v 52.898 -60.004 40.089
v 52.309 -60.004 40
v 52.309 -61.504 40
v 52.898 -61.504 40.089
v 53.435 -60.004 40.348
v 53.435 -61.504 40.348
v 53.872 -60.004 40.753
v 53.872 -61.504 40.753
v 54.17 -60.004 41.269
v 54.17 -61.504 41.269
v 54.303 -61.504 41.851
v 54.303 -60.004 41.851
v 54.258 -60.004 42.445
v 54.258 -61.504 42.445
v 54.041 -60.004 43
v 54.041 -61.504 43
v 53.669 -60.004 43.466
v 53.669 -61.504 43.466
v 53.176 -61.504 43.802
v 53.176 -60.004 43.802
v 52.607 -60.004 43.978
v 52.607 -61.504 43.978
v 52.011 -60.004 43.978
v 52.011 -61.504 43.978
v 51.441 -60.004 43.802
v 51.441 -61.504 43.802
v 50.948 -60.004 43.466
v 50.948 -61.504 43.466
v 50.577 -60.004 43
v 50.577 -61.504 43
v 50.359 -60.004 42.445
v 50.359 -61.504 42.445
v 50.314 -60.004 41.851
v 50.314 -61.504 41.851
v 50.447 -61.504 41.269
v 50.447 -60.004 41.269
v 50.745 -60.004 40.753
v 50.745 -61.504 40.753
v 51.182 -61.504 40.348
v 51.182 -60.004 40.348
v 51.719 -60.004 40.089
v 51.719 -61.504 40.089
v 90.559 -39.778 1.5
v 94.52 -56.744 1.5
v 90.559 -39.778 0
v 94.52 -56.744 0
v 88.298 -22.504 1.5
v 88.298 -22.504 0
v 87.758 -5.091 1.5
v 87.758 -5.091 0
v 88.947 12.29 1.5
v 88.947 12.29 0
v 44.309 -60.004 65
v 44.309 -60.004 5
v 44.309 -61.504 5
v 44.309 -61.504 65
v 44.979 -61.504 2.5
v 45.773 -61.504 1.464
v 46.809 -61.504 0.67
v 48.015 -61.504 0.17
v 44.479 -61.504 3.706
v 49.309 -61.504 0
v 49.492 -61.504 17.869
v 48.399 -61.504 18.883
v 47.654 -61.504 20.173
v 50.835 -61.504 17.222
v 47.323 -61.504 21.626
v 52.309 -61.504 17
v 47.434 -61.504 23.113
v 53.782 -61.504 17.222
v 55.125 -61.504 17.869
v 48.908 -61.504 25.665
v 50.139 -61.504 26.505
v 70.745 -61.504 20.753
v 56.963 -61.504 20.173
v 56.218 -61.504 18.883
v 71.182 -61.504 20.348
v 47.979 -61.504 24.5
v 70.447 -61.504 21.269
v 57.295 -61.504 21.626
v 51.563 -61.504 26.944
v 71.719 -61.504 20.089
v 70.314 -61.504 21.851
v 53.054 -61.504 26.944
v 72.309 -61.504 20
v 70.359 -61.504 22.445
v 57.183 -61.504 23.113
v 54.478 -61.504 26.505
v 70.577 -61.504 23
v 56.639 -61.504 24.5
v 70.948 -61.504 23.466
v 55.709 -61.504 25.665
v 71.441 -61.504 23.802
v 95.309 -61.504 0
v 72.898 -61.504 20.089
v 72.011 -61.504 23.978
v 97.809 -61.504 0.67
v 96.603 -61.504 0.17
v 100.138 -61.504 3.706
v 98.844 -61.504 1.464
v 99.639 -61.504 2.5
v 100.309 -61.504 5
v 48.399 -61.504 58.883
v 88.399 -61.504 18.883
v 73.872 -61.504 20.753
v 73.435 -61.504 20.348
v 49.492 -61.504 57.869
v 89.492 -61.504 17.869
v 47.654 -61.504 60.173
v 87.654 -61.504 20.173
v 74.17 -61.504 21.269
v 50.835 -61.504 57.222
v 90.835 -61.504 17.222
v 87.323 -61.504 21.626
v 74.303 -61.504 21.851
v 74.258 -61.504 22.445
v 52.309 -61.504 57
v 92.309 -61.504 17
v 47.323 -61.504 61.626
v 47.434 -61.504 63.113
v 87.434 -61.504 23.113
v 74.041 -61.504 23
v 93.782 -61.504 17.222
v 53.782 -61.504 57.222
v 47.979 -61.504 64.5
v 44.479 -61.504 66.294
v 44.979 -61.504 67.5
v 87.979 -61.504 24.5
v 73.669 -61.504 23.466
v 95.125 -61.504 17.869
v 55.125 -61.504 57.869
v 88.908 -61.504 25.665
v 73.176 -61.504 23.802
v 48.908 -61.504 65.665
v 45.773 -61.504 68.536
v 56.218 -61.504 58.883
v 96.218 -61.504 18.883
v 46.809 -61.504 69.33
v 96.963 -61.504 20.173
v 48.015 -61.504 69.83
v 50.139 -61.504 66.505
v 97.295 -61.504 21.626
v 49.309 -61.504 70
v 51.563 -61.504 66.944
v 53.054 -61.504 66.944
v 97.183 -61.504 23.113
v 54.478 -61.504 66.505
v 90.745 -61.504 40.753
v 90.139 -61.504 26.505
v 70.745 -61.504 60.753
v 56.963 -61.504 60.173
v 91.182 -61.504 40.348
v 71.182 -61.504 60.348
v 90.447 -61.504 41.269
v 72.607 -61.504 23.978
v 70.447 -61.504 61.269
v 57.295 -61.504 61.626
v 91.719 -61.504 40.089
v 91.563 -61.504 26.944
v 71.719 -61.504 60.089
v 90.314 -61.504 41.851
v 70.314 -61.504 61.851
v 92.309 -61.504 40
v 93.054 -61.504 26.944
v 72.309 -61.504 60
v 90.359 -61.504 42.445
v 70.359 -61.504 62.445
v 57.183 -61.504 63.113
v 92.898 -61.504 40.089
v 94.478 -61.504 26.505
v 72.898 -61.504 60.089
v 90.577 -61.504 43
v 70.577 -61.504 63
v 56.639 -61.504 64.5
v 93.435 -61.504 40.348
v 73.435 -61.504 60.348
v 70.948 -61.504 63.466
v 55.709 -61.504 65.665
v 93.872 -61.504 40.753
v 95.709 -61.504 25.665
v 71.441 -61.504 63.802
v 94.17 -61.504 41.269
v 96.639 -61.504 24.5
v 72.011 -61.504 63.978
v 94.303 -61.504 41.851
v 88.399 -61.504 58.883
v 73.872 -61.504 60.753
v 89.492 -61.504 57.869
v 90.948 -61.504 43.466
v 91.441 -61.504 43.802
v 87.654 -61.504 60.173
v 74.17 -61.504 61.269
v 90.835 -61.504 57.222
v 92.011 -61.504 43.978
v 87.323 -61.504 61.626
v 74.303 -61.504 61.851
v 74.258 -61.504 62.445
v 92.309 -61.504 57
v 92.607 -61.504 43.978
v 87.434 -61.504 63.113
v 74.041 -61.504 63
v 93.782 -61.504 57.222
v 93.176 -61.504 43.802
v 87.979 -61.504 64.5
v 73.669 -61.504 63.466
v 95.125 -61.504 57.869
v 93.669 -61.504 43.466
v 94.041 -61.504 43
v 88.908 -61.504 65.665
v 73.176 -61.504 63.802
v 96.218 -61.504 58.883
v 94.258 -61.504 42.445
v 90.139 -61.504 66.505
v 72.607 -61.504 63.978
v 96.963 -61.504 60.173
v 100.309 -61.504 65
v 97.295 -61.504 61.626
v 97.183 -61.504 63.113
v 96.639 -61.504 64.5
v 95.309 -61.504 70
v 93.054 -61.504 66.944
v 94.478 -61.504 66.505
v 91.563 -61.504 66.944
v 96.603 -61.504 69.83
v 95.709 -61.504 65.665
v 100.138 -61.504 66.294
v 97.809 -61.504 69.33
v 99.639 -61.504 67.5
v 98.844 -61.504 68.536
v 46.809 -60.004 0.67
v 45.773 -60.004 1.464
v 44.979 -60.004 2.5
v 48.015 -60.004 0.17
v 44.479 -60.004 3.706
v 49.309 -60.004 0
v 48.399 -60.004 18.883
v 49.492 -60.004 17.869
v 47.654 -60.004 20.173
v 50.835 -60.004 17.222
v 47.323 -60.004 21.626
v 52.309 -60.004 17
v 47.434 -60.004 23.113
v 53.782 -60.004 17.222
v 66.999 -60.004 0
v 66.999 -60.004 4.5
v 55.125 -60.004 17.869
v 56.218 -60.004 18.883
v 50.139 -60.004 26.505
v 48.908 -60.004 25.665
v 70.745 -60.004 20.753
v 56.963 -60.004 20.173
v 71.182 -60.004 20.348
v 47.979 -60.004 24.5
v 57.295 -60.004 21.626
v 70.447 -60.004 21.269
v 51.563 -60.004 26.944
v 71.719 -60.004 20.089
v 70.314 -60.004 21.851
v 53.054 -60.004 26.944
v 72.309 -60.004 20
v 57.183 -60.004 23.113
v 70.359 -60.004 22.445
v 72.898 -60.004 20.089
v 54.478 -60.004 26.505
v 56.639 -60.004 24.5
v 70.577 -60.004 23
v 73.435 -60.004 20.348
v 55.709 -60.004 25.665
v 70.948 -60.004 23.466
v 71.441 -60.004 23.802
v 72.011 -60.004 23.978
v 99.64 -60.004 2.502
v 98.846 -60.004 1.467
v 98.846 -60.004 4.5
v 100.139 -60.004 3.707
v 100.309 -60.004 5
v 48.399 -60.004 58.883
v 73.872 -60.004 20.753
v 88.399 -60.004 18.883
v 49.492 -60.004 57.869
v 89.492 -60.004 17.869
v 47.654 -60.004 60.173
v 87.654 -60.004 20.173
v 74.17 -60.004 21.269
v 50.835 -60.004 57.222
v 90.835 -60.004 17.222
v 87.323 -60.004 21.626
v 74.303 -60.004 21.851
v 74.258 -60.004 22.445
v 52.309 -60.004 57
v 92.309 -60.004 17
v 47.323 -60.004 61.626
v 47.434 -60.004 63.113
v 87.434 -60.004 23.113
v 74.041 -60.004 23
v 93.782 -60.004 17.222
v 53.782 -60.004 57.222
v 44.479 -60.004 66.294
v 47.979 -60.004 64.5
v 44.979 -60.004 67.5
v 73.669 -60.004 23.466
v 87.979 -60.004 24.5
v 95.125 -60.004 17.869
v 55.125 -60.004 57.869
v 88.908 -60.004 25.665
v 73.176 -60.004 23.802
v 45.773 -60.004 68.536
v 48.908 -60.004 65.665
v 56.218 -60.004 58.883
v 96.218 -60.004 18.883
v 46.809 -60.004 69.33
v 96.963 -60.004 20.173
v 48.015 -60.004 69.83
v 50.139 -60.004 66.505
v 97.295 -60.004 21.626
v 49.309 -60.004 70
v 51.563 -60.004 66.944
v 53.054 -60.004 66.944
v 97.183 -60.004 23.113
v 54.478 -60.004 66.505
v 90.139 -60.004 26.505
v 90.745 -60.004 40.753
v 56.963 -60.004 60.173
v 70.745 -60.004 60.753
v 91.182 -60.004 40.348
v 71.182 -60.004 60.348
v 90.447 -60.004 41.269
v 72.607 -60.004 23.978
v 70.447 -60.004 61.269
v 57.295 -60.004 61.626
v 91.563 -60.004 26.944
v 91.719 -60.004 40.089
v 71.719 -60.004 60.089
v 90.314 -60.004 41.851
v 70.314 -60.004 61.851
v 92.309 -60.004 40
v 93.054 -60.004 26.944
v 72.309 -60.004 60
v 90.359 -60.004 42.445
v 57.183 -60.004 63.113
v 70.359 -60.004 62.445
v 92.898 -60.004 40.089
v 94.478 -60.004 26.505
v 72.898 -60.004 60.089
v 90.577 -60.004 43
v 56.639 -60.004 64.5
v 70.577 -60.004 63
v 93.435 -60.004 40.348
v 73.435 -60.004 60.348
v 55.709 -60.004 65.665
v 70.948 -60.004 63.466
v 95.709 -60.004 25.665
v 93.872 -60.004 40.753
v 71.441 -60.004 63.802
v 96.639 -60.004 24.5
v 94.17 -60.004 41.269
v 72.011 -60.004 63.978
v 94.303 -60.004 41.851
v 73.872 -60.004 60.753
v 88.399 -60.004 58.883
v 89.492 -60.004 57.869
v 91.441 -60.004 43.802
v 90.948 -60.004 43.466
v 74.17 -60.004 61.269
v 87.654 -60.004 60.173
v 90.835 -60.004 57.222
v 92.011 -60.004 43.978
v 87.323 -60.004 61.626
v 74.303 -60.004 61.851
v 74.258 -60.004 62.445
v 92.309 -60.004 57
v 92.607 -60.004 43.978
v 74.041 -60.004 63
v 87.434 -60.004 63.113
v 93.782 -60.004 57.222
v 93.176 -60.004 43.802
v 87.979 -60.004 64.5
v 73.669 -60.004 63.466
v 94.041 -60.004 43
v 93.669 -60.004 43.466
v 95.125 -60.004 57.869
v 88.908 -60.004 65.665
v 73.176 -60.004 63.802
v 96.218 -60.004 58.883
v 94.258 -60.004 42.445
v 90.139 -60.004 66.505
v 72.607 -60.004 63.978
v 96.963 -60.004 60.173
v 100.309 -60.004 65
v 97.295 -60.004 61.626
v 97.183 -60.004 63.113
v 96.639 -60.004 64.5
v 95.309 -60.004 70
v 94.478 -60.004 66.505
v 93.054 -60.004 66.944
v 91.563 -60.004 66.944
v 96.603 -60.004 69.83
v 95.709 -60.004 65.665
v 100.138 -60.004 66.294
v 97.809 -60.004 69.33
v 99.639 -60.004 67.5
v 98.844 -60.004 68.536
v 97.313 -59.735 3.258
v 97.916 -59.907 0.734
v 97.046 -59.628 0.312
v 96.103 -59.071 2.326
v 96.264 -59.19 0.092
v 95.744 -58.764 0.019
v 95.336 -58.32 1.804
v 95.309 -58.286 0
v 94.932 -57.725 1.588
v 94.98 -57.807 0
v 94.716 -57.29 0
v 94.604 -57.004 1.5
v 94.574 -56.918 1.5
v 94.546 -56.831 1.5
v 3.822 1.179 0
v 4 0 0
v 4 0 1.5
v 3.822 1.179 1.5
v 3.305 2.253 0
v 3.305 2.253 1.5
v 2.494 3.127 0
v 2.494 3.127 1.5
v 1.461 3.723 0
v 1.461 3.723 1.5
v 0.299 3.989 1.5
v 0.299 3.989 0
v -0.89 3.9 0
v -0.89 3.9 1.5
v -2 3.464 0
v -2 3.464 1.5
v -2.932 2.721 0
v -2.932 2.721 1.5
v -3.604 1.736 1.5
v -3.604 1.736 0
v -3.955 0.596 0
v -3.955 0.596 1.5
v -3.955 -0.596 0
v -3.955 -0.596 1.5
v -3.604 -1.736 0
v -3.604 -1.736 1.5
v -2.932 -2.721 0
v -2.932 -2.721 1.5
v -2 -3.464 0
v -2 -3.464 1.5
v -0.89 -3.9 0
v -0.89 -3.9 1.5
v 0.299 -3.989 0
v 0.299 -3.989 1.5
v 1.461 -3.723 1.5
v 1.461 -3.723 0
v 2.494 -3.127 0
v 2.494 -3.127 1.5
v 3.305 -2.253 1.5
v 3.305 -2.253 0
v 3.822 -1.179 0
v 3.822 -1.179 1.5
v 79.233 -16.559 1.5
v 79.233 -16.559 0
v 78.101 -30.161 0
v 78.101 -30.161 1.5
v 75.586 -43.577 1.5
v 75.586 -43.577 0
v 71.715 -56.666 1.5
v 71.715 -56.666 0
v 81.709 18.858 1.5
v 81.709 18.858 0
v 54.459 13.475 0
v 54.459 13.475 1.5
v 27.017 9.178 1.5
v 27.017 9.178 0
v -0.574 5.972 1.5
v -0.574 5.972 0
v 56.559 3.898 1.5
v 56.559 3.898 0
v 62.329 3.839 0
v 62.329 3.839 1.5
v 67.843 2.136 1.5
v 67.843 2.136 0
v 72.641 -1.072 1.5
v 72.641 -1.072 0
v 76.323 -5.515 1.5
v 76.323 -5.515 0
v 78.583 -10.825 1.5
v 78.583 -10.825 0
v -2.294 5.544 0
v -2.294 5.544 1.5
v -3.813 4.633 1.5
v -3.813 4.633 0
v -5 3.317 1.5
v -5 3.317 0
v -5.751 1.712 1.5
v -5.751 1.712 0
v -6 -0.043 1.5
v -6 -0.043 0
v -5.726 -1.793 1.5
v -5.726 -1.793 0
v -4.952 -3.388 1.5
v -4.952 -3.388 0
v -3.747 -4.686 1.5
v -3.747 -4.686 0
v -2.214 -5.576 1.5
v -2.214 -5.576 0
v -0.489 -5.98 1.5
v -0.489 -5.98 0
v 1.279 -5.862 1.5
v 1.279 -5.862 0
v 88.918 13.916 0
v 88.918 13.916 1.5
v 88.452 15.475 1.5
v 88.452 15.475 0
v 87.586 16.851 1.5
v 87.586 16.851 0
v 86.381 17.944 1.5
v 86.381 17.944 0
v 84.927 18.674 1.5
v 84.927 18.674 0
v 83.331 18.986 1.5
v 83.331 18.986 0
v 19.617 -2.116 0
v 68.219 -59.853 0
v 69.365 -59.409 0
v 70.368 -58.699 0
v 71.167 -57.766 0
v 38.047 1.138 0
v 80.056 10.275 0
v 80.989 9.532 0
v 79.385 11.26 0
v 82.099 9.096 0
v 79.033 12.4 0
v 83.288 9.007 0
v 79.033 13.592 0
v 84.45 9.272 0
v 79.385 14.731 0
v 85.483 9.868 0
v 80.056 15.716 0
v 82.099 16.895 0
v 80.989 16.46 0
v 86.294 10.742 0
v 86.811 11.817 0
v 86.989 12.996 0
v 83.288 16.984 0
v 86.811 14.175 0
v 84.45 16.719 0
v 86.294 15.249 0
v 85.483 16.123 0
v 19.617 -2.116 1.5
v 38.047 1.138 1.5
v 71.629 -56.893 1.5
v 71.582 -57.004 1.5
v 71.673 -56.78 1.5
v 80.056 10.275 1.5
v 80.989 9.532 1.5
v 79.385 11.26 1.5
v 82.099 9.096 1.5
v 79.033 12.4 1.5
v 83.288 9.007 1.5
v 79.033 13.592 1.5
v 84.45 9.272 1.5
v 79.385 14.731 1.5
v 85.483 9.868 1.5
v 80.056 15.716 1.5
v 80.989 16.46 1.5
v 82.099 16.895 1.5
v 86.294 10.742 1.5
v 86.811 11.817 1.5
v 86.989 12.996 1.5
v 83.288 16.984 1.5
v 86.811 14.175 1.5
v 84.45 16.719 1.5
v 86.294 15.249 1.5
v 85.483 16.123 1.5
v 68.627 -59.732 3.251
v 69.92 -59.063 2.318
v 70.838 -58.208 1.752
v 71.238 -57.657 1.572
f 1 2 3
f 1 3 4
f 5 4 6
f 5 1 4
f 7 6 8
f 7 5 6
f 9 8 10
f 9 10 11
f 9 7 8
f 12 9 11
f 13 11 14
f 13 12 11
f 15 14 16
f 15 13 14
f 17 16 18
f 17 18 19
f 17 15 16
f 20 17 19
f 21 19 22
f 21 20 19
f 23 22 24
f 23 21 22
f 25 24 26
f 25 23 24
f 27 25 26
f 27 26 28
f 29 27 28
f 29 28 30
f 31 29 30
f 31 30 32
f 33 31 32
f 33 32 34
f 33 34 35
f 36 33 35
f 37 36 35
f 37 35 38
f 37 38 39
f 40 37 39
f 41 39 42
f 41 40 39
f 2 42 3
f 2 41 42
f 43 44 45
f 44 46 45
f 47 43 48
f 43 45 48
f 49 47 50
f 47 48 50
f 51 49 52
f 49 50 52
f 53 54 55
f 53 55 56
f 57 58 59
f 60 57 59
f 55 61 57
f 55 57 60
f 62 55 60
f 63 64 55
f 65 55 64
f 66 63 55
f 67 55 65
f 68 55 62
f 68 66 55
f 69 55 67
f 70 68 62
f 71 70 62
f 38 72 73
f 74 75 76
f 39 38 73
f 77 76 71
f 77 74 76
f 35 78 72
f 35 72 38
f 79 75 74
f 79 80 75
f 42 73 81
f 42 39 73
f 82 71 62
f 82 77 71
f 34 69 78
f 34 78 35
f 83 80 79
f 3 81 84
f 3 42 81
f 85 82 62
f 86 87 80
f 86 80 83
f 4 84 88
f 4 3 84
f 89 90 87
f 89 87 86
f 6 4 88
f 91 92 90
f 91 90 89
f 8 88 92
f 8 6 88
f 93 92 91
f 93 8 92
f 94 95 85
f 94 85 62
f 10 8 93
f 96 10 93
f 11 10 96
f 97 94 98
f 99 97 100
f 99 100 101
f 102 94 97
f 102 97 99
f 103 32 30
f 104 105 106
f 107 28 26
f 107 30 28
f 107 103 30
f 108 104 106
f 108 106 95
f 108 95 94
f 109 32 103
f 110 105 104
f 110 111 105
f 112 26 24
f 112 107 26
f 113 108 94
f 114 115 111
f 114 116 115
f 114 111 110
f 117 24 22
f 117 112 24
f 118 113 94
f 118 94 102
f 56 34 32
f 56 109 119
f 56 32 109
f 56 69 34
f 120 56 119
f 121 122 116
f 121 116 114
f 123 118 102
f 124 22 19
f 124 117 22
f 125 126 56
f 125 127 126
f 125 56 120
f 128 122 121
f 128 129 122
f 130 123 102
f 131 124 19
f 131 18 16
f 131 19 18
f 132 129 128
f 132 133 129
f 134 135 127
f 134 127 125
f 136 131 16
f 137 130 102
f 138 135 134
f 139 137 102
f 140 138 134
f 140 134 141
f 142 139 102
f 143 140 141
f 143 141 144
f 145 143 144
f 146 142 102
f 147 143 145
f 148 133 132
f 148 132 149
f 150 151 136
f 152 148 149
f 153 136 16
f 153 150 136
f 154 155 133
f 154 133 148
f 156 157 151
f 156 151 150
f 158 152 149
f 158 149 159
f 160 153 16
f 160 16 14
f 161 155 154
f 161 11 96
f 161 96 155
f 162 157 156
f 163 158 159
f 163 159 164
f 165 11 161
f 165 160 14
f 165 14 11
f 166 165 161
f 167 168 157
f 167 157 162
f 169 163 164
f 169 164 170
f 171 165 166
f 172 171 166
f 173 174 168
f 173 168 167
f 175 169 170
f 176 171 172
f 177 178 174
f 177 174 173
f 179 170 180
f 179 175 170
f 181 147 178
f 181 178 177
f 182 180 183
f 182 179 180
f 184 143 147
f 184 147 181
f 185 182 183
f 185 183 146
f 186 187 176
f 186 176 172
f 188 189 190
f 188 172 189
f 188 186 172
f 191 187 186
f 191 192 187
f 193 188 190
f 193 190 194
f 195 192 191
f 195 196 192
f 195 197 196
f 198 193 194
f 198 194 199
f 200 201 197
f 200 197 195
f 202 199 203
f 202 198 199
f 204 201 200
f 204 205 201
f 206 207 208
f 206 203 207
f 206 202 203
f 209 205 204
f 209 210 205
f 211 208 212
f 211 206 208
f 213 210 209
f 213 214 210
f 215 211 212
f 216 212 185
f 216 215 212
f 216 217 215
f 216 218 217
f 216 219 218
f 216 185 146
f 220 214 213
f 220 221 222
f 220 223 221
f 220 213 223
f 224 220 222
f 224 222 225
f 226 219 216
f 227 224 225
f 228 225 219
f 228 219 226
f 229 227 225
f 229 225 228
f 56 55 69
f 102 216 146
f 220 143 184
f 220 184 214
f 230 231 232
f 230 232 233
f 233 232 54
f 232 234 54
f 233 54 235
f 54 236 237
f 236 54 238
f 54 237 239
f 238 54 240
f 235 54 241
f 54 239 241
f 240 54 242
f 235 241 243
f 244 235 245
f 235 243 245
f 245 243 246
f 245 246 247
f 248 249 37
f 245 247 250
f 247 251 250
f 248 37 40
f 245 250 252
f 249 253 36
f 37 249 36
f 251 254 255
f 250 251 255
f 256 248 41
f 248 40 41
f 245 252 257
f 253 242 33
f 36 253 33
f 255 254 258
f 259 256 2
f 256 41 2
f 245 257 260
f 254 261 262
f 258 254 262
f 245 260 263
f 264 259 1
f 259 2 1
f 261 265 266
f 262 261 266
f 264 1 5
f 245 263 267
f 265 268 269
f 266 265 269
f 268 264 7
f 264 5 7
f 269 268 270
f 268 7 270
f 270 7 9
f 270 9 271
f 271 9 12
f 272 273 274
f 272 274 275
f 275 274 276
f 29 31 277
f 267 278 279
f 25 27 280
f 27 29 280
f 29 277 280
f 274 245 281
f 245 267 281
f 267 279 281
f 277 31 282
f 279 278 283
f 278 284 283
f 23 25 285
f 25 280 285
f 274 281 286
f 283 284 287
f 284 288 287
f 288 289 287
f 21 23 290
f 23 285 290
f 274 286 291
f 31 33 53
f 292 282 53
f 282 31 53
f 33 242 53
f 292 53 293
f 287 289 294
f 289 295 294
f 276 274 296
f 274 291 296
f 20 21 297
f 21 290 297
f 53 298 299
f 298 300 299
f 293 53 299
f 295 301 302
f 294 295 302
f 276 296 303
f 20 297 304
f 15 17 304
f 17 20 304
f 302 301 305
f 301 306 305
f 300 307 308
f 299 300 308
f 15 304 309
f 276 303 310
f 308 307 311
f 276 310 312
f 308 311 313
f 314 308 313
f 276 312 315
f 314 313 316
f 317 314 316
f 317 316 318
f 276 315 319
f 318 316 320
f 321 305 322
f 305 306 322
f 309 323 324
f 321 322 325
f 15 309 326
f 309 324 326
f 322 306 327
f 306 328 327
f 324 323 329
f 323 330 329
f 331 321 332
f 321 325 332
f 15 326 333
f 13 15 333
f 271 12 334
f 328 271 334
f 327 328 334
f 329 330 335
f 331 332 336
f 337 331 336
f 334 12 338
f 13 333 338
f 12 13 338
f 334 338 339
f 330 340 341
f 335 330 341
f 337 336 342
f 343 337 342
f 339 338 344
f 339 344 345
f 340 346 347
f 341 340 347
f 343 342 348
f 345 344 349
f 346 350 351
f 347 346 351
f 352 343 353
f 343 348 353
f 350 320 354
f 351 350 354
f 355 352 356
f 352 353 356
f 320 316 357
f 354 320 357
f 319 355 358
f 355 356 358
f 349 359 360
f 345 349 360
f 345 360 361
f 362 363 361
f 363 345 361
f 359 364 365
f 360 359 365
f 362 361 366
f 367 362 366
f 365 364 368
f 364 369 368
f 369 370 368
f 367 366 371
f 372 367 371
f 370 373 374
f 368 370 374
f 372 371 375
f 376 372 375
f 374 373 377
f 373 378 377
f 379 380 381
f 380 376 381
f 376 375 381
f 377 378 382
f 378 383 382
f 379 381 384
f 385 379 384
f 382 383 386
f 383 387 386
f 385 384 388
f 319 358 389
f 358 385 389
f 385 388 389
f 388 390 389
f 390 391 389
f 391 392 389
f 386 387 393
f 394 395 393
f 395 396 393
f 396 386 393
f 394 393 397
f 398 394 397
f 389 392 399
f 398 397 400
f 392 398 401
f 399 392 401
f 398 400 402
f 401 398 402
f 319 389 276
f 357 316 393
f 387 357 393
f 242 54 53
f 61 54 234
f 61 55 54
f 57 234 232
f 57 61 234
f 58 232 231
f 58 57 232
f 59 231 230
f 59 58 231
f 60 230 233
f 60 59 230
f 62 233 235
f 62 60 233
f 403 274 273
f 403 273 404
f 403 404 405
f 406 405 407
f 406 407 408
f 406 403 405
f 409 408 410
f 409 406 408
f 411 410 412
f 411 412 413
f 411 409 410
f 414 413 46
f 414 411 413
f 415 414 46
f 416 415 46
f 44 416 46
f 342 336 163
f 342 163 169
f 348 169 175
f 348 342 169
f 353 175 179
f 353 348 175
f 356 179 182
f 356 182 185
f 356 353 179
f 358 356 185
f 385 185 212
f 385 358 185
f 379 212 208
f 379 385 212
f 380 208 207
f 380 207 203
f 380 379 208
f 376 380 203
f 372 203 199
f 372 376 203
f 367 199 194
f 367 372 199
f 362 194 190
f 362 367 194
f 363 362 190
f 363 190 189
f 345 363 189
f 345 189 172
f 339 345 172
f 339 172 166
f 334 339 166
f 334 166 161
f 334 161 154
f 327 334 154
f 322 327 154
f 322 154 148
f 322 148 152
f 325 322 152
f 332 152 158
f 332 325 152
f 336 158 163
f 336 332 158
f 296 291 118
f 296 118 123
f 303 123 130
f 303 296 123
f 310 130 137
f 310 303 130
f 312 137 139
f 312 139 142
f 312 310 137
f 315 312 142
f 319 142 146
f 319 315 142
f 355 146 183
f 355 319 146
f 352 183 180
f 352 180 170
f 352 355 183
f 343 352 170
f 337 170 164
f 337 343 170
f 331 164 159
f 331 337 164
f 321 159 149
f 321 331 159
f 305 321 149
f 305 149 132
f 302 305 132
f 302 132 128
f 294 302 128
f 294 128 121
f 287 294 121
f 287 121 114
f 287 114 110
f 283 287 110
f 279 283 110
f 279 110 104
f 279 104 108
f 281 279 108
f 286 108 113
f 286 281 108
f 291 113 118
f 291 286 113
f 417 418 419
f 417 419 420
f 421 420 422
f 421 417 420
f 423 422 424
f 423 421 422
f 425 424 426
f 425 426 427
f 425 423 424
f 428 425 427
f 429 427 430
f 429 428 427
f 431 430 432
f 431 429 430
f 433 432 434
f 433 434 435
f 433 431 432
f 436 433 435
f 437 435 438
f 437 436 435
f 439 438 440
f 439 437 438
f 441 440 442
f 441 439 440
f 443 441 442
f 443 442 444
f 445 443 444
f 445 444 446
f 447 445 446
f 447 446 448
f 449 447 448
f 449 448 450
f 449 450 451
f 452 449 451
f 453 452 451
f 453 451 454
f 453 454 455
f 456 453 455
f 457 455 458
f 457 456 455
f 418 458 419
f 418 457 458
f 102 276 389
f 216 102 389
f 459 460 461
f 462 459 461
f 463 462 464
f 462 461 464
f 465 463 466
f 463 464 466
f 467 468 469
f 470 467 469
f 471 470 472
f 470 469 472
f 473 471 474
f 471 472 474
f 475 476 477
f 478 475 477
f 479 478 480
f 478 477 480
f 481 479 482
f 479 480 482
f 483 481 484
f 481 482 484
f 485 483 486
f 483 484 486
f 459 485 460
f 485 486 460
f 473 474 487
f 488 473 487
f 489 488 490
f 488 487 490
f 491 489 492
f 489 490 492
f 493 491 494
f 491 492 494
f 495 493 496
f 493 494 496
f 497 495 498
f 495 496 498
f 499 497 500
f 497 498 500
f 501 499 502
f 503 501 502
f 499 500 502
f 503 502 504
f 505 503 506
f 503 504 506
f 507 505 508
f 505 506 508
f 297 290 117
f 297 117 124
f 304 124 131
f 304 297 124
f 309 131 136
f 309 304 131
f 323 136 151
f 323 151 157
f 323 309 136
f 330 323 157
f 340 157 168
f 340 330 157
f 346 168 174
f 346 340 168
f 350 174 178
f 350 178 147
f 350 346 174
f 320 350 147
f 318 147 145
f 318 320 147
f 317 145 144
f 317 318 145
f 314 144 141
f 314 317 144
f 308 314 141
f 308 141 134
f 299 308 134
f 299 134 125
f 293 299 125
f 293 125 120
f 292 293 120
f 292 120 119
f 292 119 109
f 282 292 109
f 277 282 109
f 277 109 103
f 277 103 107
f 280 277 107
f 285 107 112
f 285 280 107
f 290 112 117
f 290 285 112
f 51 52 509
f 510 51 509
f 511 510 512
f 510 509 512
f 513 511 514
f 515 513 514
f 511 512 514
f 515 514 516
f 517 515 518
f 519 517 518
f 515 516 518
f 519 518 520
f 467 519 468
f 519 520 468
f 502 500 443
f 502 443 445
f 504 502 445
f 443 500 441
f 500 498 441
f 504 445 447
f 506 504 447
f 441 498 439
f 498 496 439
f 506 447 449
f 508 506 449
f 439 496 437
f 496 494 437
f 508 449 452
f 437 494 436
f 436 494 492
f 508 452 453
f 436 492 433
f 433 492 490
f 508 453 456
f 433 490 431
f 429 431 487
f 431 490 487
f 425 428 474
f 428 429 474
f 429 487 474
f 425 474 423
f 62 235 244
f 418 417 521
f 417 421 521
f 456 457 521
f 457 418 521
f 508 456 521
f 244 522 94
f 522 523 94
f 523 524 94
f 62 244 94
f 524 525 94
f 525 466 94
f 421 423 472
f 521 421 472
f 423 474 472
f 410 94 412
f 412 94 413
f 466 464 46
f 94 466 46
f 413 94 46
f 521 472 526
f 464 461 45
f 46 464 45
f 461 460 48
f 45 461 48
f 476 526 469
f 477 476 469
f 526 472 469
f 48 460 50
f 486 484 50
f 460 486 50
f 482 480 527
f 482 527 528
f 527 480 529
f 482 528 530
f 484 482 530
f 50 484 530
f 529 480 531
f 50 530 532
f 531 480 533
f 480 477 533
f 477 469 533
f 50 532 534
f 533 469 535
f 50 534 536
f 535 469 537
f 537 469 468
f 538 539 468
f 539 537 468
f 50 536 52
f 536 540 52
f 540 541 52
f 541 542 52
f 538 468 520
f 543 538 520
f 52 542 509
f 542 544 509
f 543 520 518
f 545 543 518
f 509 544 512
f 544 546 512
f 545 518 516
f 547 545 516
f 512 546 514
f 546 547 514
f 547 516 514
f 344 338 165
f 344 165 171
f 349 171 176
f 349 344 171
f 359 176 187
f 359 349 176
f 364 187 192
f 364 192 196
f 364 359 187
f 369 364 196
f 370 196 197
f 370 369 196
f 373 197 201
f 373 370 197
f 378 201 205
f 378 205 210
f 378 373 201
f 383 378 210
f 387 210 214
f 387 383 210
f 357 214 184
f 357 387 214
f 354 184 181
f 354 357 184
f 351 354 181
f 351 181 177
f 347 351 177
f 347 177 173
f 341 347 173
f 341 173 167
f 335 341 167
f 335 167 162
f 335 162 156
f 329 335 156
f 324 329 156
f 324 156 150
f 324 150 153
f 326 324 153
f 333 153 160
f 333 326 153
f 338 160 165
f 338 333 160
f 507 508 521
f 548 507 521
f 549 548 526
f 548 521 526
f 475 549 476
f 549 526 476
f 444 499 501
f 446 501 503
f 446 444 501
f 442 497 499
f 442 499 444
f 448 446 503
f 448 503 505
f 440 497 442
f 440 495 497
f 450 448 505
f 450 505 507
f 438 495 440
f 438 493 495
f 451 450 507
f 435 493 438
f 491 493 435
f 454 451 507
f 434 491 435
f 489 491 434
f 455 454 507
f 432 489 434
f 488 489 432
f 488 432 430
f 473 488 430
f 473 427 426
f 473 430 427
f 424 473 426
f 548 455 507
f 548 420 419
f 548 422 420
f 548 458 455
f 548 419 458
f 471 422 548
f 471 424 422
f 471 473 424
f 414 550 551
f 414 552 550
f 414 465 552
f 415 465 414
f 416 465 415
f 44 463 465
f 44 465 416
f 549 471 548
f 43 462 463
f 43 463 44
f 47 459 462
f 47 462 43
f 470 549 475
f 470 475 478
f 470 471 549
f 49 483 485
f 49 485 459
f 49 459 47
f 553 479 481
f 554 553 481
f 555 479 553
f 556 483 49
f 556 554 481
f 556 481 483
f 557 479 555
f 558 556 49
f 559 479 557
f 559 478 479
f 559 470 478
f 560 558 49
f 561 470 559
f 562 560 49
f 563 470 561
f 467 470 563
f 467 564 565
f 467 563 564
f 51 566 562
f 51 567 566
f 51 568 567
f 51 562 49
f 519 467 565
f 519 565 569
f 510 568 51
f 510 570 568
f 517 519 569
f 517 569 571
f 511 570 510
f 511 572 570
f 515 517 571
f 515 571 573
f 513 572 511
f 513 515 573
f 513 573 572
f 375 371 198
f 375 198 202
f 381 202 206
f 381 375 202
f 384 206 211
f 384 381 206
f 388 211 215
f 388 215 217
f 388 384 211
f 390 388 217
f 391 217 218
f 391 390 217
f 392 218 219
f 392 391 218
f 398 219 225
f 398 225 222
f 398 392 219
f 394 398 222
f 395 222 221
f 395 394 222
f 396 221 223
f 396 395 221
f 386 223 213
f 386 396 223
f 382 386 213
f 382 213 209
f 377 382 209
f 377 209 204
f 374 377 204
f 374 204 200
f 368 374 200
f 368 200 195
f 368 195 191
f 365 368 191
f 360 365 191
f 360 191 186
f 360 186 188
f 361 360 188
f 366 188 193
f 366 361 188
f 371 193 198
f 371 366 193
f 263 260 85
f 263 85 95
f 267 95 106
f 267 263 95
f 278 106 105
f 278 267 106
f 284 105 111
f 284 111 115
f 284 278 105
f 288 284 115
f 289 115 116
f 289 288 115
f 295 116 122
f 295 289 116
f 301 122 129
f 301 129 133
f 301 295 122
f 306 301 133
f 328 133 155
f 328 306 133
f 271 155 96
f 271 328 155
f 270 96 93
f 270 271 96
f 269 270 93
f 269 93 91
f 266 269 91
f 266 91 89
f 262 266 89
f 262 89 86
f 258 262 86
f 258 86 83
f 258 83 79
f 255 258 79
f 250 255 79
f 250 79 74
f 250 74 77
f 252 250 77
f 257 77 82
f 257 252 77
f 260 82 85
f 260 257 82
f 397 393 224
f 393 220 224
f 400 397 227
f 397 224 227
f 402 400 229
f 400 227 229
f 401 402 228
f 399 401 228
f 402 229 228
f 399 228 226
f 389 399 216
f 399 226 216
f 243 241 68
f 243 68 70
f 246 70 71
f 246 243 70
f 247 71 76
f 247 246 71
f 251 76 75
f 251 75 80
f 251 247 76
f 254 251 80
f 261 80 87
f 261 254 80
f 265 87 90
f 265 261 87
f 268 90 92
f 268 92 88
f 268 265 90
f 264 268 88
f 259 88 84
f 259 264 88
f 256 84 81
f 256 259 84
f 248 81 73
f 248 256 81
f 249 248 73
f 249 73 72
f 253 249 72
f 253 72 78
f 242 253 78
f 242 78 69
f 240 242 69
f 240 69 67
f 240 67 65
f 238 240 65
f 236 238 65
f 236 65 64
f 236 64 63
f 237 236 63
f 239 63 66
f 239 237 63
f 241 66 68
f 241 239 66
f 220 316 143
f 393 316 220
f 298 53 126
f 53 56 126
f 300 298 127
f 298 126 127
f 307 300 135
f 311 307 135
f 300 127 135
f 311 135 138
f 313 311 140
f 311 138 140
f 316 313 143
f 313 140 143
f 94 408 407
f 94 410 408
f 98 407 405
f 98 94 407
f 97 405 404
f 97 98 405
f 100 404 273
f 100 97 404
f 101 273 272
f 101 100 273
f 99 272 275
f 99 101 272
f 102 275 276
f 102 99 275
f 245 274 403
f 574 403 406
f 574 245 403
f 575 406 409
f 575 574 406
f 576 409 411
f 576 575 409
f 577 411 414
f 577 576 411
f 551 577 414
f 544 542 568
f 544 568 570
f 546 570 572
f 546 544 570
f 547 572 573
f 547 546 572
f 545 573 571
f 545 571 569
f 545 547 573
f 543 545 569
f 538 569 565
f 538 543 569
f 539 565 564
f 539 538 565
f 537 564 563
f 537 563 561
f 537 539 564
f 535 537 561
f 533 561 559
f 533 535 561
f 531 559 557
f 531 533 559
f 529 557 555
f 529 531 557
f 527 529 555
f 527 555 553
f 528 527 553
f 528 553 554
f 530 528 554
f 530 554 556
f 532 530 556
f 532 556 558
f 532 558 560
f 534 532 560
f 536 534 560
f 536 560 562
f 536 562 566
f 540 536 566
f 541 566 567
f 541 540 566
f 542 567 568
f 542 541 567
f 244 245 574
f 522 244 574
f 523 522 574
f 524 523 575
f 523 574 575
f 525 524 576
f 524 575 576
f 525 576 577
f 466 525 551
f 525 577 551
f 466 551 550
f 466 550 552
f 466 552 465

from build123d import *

# Parameters (mm, degrees)
SKETCH1_R           = 4
BOSS_EXTRUDE2_DEPTH = 1.5
SKETCH2_W           = 56
SKETCH2_H           = 70
SKETCH2_R           = 2
SKETCH2_R_2         = 5
BOSS_EXTRUDE3_DEPTH = 1.5
FILLET1_R           = 5
FILLET3_R           = 5
FILLET4_R           = 4.5
FILLET5_R           = 3


with BuildPart() as part:
    # Sketch1 → Boss-Extrude2 (new body)
    with BuildSketch(Plane.XY):
        with BuildLine():
            Line((70.488628725, -60.004327551), (95.488628725, -60.004327551))
            ThreePointArc((95.488628725, -60.004327551), (88.442611877, -24.198764926), (88.946986918, 12.290004224))
            ThreePointArc((88.946986918, 12.290004224), (87.020647932, 17.438961897), (81.709367557, 18.857710564))
            ThreePointArc((81.709367557, 18.857710564), (40.759501769, 11.190251314), (-0.573975371, 5.972482924))
            ThreePointArc((-0.573975371, 5.972482924), (-5.927759195, -0.928262318), (1.279261167, -5.862038115))
            ThreePointArc((1.279261167, -5.862038115), (28.82108484, -0.427804063), (56.558651128, 3.897744149))
            ThreePointArc((56.558651128, 3.897744149), (72.640680785, -1.071518566), (79.233271708, -16.559029494))
            ThreePointArc((79.233271708, -16.559029494), (76.676068341, -38.647024387), (70.488628725, -60.004327551))
        make_face()
        Circle(SKETCH1_R, mode=Mode.SUBTRACT)
        with Locations((82.988628725, 12.995672449)):
            Circle(SKETCH1_R, mode=Mode.SUBTRACT)
    extrude(amount=BOSS_EXTRUDE2_DEPTH)

    # Sketch2 → Boss-Extrude3 (add)
    with BuildSketch(Plane.XZ.offset(60.004327551)):
        with Locations((72.308628725, 35)):
            Rectangle(SKETCH2_W, SKETCH2_H)
        with Locations(Location((92.308628725, 42, 0), (0, 0, 270))):
            Circle(SKETCH2_R, mode=Mode.SUBTRACT)
        with Locations(Location((72.308628725, 22, 0), (0, 0, 270))):
            Circle(SKETCH2_R, mode=Mode.SUBTRACT)
        with Locations(Location((52.308628725, 42, 0), (0, 0, 270))):
            Circle(SKETCH2_R, mode=Mode.SUBTRACT)
        with Locations(Location((72.308628725, 62, 0), (0, 0, 270))):
            Circle(SKETCH2_R, mode=Mode.SUBTRACT)
        with Locations(Location((52.308628725, 22, 0), (0, 0, 270))):
            Circle(SKETCH2_R_2, mode=Mode.SUBTRACT)
        with Locations(Location((92.308628725, 22, 0), (0, 0, 270))):
            Circle(SKETCH2_R_2, mode=Mode.SUBTRACT)
        with Locations(Location((92.308628725, 62, 0), (0, 0, 270))):
            Circle(SKETCH2_R_2, mode=Mode.SUBTRACT)
        with Locations(Location((52.308628725, 62, 0), (0, 0, 270))):
            Circle(SKETCH2_R_2, mode=Mode.SUBTRACT)
    extrude(amount=BOSS_EXTRUDE3_DEPTH)

    # Fillet1
    fillet1_edges = [part.edges().sort_by_distance(p)[0] for p in [
        (100.308628725, -60.754327551, 0),
        (100.308628725, -60.754327551, 70),
        (44.308628725, -60.754327551, 70),
        (44.308628725, -60.754327551, 0),
    ]]
    fillet(fillet1_edges, radius=FILLET1_R)

    # Fillet3
    fillet3_edges = [part.edges().sort_by_distance(p)[0] for p in [
        (70.488628725, -60.004327551, 0.75),
    ]]
    fillet(fillet3_edges, radius=FILLET3_R)

    # Fillet4
    fillet4_edges = [part.edges().sort_by_distance(p)[0] for p in [
        (95.488628725, -60.004327551, 0.751620525),
    ]]
    fillet(fillet4_edges, radius=FILLET4_R)

    # Fillet5
    fillet5_edges = [part.edges().sort_by_distance(p)[0] for p in [
        (82.922685412, -60.004327551, 1.5),
    ]]
    fillet(fillet5_edges, radius=FILLET5_R)


solid = part.part
